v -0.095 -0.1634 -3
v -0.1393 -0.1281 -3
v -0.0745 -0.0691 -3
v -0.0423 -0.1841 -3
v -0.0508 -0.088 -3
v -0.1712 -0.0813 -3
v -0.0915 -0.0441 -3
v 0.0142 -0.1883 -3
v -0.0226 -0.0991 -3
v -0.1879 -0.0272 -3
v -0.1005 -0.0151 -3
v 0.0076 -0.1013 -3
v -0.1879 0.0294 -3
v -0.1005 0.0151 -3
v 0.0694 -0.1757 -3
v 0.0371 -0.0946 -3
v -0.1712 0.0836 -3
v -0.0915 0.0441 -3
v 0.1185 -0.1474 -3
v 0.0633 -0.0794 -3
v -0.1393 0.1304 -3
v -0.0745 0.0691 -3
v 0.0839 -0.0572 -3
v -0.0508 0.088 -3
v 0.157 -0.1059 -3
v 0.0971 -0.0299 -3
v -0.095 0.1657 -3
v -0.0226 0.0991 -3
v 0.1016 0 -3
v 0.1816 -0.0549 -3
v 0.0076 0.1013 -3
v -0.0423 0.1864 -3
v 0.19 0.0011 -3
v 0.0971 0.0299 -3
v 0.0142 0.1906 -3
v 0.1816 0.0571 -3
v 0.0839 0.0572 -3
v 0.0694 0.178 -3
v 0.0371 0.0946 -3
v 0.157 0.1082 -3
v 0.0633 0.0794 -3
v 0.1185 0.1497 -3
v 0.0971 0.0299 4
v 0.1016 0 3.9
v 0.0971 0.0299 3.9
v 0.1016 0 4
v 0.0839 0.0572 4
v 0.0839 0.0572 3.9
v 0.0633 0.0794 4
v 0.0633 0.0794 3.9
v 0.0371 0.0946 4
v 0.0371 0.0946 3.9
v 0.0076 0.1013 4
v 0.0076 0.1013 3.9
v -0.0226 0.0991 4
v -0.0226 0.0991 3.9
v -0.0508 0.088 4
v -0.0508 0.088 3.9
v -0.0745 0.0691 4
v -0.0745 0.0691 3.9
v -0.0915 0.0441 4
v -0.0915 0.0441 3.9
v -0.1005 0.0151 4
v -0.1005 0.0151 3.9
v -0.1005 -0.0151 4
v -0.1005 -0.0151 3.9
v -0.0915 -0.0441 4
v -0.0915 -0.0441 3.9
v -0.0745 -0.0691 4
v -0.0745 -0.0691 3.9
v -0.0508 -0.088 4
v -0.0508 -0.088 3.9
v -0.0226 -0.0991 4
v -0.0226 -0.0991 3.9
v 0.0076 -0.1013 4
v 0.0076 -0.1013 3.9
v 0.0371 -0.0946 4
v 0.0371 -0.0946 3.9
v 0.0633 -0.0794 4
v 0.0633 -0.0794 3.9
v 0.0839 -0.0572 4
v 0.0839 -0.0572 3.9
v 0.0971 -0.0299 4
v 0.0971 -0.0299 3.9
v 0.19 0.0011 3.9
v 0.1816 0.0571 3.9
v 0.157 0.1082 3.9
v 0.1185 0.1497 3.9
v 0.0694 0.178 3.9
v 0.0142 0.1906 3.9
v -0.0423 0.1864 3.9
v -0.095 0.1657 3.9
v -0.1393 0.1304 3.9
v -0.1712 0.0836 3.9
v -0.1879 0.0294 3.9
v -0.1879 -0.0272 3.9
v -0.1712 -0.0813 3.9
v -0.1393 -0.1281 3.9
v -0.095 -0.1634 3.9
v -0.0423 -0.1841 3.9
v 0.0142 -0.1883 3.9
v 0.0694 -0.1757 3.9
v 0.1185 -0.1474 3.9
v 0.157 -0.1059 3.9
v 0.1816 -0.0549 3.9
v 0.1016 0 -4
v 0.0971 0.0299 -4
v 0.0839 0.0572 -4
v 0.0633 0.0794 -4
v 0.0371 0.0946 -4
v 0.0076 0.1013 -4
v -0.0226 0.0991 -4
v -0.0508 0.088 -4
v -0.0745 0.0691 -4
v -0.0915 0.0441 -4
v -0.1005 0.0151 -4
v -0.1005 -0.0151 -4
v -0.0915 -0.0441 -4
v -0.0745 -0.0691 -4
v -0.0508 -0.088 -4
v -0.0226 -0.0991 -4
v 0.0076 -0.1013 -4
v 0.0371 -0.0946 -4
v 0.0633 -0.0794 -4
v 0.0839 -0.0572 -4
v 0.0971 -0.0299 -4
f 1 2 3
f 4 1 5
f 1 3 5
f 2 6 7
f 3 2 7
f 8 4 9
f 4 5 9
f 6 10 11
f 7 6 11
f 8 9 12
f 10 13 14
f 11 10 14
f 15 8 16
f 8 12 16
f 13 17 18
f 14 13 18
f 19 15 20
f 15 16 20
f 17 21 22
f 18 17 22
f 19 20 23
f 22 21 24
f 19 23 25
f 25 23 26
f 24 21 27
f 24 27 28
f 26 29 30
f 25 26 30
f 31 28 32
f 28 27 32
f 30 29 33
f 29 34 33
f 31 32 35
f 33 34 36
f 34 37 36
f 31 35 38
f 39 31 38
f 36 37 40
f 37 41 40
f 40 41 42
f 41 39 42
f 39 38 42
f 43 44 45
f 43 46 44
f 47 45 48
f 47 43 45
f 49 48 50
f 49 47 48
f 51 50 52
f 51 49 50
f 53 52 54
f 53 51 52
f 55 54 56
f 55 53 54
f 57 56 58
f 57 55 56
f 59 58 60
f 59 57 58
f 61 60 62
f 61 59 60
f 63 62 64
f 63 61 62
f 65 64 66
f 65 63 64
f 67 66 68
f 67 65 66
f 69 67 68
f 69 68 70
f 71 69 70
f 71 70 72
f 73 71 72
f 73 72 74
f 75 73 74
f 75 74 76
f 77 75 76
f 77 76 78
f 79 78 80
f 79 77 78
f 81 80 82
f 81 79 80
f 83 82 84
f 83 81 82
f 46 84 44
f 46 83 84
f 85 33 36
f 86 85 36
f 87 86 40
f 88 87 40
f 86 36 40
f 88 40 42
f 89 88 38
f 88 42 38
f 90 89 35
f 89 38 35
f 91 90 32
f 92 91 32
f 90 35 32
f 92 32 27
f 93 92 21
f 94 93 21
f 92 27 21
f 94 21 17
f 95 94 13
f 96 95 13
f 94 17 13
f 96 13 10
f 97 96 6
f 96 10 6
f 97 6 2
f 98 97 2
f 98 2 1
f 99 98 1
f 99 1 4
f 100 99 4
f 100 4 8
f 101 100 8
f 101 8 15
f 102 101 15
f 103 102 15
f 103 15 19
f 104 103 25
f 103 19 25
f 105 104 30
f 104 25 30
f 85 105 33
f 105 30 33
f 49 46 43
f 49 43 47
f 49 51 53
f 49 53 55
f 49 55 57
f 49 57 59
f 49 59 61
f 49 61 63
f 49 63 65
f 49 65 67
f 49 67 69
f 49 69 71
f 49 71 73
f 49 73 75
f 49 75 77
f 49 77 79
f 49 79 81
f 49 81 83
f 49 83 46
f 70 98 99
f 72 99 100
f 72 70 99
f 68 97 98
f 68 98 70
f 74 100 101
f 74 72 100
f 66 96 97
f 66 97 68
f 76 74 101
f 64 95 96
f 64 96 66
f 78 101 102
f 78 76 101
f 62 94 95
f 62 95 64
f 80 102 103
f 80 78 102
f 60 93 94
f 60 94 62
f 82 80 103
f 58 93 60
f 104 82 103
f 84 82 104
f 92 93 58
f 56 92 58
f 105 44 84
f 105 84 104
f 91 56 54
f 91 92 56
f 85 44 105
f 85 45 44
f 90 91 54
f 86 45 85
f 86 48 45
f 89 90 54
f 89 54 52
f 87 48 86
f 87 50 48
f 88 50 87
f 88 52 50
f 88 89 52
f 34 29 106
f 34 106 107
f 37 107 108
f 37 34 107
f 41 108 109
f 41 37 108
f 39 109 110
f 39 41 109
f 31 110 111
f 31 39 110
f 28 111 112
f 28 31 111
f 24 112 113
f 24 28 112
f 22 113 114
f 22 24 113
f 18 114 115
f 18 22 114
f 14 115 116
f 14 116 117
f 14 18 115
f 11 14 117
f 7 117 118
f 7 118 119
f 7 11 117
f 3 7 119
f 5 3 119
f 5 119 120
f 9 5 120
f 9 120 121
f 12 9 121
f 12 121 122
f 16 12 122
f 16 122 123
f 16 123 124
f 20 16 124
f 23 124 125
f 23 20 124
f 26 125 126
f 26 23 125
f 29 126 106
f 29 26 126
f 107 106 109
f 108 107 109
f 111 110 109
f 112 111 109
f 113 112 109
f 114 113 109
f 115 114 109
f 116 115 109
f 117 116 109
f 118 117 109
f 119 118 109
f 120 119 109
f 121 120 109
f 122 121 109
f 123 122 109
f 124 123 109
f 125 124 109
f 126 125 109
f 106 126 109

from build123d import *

# Parameters (mm, degrees)
SKETCH_1_R           = 0.1016
EXTRUDE_1_DEPTH      = 4
EXTRUDE_2_DEPTH      = 3.9
EXTRUDE_2_DEPTH_BACK = 3
SKETCH_2_R           = 0.19


with BuildPart() as part:
    # 草图1 → 凸台-拉伸1 (new, symmetric)
    with BuildSketch(Plane.XY):
        Circle(SKETCH_1_R)
    extrude(amount=EXTRUDE_1_DEPTH, both=True)

    # 草图2 → 凸台-拉伸2 (add, two sides: drawn at the far end of the back side and taken through both)
    with BuildSketch(Plane.XY.offset(-EXTRUDE_2_DEPTH_BACK)):
        with Locations((0, 0.001129958)):
            Circle(SKETCH_2_R)
    extrude(amount=EXTRUDE_2_DEPTH + EXTRUDE_2_DEPTH_BACK)


solid = part.part
